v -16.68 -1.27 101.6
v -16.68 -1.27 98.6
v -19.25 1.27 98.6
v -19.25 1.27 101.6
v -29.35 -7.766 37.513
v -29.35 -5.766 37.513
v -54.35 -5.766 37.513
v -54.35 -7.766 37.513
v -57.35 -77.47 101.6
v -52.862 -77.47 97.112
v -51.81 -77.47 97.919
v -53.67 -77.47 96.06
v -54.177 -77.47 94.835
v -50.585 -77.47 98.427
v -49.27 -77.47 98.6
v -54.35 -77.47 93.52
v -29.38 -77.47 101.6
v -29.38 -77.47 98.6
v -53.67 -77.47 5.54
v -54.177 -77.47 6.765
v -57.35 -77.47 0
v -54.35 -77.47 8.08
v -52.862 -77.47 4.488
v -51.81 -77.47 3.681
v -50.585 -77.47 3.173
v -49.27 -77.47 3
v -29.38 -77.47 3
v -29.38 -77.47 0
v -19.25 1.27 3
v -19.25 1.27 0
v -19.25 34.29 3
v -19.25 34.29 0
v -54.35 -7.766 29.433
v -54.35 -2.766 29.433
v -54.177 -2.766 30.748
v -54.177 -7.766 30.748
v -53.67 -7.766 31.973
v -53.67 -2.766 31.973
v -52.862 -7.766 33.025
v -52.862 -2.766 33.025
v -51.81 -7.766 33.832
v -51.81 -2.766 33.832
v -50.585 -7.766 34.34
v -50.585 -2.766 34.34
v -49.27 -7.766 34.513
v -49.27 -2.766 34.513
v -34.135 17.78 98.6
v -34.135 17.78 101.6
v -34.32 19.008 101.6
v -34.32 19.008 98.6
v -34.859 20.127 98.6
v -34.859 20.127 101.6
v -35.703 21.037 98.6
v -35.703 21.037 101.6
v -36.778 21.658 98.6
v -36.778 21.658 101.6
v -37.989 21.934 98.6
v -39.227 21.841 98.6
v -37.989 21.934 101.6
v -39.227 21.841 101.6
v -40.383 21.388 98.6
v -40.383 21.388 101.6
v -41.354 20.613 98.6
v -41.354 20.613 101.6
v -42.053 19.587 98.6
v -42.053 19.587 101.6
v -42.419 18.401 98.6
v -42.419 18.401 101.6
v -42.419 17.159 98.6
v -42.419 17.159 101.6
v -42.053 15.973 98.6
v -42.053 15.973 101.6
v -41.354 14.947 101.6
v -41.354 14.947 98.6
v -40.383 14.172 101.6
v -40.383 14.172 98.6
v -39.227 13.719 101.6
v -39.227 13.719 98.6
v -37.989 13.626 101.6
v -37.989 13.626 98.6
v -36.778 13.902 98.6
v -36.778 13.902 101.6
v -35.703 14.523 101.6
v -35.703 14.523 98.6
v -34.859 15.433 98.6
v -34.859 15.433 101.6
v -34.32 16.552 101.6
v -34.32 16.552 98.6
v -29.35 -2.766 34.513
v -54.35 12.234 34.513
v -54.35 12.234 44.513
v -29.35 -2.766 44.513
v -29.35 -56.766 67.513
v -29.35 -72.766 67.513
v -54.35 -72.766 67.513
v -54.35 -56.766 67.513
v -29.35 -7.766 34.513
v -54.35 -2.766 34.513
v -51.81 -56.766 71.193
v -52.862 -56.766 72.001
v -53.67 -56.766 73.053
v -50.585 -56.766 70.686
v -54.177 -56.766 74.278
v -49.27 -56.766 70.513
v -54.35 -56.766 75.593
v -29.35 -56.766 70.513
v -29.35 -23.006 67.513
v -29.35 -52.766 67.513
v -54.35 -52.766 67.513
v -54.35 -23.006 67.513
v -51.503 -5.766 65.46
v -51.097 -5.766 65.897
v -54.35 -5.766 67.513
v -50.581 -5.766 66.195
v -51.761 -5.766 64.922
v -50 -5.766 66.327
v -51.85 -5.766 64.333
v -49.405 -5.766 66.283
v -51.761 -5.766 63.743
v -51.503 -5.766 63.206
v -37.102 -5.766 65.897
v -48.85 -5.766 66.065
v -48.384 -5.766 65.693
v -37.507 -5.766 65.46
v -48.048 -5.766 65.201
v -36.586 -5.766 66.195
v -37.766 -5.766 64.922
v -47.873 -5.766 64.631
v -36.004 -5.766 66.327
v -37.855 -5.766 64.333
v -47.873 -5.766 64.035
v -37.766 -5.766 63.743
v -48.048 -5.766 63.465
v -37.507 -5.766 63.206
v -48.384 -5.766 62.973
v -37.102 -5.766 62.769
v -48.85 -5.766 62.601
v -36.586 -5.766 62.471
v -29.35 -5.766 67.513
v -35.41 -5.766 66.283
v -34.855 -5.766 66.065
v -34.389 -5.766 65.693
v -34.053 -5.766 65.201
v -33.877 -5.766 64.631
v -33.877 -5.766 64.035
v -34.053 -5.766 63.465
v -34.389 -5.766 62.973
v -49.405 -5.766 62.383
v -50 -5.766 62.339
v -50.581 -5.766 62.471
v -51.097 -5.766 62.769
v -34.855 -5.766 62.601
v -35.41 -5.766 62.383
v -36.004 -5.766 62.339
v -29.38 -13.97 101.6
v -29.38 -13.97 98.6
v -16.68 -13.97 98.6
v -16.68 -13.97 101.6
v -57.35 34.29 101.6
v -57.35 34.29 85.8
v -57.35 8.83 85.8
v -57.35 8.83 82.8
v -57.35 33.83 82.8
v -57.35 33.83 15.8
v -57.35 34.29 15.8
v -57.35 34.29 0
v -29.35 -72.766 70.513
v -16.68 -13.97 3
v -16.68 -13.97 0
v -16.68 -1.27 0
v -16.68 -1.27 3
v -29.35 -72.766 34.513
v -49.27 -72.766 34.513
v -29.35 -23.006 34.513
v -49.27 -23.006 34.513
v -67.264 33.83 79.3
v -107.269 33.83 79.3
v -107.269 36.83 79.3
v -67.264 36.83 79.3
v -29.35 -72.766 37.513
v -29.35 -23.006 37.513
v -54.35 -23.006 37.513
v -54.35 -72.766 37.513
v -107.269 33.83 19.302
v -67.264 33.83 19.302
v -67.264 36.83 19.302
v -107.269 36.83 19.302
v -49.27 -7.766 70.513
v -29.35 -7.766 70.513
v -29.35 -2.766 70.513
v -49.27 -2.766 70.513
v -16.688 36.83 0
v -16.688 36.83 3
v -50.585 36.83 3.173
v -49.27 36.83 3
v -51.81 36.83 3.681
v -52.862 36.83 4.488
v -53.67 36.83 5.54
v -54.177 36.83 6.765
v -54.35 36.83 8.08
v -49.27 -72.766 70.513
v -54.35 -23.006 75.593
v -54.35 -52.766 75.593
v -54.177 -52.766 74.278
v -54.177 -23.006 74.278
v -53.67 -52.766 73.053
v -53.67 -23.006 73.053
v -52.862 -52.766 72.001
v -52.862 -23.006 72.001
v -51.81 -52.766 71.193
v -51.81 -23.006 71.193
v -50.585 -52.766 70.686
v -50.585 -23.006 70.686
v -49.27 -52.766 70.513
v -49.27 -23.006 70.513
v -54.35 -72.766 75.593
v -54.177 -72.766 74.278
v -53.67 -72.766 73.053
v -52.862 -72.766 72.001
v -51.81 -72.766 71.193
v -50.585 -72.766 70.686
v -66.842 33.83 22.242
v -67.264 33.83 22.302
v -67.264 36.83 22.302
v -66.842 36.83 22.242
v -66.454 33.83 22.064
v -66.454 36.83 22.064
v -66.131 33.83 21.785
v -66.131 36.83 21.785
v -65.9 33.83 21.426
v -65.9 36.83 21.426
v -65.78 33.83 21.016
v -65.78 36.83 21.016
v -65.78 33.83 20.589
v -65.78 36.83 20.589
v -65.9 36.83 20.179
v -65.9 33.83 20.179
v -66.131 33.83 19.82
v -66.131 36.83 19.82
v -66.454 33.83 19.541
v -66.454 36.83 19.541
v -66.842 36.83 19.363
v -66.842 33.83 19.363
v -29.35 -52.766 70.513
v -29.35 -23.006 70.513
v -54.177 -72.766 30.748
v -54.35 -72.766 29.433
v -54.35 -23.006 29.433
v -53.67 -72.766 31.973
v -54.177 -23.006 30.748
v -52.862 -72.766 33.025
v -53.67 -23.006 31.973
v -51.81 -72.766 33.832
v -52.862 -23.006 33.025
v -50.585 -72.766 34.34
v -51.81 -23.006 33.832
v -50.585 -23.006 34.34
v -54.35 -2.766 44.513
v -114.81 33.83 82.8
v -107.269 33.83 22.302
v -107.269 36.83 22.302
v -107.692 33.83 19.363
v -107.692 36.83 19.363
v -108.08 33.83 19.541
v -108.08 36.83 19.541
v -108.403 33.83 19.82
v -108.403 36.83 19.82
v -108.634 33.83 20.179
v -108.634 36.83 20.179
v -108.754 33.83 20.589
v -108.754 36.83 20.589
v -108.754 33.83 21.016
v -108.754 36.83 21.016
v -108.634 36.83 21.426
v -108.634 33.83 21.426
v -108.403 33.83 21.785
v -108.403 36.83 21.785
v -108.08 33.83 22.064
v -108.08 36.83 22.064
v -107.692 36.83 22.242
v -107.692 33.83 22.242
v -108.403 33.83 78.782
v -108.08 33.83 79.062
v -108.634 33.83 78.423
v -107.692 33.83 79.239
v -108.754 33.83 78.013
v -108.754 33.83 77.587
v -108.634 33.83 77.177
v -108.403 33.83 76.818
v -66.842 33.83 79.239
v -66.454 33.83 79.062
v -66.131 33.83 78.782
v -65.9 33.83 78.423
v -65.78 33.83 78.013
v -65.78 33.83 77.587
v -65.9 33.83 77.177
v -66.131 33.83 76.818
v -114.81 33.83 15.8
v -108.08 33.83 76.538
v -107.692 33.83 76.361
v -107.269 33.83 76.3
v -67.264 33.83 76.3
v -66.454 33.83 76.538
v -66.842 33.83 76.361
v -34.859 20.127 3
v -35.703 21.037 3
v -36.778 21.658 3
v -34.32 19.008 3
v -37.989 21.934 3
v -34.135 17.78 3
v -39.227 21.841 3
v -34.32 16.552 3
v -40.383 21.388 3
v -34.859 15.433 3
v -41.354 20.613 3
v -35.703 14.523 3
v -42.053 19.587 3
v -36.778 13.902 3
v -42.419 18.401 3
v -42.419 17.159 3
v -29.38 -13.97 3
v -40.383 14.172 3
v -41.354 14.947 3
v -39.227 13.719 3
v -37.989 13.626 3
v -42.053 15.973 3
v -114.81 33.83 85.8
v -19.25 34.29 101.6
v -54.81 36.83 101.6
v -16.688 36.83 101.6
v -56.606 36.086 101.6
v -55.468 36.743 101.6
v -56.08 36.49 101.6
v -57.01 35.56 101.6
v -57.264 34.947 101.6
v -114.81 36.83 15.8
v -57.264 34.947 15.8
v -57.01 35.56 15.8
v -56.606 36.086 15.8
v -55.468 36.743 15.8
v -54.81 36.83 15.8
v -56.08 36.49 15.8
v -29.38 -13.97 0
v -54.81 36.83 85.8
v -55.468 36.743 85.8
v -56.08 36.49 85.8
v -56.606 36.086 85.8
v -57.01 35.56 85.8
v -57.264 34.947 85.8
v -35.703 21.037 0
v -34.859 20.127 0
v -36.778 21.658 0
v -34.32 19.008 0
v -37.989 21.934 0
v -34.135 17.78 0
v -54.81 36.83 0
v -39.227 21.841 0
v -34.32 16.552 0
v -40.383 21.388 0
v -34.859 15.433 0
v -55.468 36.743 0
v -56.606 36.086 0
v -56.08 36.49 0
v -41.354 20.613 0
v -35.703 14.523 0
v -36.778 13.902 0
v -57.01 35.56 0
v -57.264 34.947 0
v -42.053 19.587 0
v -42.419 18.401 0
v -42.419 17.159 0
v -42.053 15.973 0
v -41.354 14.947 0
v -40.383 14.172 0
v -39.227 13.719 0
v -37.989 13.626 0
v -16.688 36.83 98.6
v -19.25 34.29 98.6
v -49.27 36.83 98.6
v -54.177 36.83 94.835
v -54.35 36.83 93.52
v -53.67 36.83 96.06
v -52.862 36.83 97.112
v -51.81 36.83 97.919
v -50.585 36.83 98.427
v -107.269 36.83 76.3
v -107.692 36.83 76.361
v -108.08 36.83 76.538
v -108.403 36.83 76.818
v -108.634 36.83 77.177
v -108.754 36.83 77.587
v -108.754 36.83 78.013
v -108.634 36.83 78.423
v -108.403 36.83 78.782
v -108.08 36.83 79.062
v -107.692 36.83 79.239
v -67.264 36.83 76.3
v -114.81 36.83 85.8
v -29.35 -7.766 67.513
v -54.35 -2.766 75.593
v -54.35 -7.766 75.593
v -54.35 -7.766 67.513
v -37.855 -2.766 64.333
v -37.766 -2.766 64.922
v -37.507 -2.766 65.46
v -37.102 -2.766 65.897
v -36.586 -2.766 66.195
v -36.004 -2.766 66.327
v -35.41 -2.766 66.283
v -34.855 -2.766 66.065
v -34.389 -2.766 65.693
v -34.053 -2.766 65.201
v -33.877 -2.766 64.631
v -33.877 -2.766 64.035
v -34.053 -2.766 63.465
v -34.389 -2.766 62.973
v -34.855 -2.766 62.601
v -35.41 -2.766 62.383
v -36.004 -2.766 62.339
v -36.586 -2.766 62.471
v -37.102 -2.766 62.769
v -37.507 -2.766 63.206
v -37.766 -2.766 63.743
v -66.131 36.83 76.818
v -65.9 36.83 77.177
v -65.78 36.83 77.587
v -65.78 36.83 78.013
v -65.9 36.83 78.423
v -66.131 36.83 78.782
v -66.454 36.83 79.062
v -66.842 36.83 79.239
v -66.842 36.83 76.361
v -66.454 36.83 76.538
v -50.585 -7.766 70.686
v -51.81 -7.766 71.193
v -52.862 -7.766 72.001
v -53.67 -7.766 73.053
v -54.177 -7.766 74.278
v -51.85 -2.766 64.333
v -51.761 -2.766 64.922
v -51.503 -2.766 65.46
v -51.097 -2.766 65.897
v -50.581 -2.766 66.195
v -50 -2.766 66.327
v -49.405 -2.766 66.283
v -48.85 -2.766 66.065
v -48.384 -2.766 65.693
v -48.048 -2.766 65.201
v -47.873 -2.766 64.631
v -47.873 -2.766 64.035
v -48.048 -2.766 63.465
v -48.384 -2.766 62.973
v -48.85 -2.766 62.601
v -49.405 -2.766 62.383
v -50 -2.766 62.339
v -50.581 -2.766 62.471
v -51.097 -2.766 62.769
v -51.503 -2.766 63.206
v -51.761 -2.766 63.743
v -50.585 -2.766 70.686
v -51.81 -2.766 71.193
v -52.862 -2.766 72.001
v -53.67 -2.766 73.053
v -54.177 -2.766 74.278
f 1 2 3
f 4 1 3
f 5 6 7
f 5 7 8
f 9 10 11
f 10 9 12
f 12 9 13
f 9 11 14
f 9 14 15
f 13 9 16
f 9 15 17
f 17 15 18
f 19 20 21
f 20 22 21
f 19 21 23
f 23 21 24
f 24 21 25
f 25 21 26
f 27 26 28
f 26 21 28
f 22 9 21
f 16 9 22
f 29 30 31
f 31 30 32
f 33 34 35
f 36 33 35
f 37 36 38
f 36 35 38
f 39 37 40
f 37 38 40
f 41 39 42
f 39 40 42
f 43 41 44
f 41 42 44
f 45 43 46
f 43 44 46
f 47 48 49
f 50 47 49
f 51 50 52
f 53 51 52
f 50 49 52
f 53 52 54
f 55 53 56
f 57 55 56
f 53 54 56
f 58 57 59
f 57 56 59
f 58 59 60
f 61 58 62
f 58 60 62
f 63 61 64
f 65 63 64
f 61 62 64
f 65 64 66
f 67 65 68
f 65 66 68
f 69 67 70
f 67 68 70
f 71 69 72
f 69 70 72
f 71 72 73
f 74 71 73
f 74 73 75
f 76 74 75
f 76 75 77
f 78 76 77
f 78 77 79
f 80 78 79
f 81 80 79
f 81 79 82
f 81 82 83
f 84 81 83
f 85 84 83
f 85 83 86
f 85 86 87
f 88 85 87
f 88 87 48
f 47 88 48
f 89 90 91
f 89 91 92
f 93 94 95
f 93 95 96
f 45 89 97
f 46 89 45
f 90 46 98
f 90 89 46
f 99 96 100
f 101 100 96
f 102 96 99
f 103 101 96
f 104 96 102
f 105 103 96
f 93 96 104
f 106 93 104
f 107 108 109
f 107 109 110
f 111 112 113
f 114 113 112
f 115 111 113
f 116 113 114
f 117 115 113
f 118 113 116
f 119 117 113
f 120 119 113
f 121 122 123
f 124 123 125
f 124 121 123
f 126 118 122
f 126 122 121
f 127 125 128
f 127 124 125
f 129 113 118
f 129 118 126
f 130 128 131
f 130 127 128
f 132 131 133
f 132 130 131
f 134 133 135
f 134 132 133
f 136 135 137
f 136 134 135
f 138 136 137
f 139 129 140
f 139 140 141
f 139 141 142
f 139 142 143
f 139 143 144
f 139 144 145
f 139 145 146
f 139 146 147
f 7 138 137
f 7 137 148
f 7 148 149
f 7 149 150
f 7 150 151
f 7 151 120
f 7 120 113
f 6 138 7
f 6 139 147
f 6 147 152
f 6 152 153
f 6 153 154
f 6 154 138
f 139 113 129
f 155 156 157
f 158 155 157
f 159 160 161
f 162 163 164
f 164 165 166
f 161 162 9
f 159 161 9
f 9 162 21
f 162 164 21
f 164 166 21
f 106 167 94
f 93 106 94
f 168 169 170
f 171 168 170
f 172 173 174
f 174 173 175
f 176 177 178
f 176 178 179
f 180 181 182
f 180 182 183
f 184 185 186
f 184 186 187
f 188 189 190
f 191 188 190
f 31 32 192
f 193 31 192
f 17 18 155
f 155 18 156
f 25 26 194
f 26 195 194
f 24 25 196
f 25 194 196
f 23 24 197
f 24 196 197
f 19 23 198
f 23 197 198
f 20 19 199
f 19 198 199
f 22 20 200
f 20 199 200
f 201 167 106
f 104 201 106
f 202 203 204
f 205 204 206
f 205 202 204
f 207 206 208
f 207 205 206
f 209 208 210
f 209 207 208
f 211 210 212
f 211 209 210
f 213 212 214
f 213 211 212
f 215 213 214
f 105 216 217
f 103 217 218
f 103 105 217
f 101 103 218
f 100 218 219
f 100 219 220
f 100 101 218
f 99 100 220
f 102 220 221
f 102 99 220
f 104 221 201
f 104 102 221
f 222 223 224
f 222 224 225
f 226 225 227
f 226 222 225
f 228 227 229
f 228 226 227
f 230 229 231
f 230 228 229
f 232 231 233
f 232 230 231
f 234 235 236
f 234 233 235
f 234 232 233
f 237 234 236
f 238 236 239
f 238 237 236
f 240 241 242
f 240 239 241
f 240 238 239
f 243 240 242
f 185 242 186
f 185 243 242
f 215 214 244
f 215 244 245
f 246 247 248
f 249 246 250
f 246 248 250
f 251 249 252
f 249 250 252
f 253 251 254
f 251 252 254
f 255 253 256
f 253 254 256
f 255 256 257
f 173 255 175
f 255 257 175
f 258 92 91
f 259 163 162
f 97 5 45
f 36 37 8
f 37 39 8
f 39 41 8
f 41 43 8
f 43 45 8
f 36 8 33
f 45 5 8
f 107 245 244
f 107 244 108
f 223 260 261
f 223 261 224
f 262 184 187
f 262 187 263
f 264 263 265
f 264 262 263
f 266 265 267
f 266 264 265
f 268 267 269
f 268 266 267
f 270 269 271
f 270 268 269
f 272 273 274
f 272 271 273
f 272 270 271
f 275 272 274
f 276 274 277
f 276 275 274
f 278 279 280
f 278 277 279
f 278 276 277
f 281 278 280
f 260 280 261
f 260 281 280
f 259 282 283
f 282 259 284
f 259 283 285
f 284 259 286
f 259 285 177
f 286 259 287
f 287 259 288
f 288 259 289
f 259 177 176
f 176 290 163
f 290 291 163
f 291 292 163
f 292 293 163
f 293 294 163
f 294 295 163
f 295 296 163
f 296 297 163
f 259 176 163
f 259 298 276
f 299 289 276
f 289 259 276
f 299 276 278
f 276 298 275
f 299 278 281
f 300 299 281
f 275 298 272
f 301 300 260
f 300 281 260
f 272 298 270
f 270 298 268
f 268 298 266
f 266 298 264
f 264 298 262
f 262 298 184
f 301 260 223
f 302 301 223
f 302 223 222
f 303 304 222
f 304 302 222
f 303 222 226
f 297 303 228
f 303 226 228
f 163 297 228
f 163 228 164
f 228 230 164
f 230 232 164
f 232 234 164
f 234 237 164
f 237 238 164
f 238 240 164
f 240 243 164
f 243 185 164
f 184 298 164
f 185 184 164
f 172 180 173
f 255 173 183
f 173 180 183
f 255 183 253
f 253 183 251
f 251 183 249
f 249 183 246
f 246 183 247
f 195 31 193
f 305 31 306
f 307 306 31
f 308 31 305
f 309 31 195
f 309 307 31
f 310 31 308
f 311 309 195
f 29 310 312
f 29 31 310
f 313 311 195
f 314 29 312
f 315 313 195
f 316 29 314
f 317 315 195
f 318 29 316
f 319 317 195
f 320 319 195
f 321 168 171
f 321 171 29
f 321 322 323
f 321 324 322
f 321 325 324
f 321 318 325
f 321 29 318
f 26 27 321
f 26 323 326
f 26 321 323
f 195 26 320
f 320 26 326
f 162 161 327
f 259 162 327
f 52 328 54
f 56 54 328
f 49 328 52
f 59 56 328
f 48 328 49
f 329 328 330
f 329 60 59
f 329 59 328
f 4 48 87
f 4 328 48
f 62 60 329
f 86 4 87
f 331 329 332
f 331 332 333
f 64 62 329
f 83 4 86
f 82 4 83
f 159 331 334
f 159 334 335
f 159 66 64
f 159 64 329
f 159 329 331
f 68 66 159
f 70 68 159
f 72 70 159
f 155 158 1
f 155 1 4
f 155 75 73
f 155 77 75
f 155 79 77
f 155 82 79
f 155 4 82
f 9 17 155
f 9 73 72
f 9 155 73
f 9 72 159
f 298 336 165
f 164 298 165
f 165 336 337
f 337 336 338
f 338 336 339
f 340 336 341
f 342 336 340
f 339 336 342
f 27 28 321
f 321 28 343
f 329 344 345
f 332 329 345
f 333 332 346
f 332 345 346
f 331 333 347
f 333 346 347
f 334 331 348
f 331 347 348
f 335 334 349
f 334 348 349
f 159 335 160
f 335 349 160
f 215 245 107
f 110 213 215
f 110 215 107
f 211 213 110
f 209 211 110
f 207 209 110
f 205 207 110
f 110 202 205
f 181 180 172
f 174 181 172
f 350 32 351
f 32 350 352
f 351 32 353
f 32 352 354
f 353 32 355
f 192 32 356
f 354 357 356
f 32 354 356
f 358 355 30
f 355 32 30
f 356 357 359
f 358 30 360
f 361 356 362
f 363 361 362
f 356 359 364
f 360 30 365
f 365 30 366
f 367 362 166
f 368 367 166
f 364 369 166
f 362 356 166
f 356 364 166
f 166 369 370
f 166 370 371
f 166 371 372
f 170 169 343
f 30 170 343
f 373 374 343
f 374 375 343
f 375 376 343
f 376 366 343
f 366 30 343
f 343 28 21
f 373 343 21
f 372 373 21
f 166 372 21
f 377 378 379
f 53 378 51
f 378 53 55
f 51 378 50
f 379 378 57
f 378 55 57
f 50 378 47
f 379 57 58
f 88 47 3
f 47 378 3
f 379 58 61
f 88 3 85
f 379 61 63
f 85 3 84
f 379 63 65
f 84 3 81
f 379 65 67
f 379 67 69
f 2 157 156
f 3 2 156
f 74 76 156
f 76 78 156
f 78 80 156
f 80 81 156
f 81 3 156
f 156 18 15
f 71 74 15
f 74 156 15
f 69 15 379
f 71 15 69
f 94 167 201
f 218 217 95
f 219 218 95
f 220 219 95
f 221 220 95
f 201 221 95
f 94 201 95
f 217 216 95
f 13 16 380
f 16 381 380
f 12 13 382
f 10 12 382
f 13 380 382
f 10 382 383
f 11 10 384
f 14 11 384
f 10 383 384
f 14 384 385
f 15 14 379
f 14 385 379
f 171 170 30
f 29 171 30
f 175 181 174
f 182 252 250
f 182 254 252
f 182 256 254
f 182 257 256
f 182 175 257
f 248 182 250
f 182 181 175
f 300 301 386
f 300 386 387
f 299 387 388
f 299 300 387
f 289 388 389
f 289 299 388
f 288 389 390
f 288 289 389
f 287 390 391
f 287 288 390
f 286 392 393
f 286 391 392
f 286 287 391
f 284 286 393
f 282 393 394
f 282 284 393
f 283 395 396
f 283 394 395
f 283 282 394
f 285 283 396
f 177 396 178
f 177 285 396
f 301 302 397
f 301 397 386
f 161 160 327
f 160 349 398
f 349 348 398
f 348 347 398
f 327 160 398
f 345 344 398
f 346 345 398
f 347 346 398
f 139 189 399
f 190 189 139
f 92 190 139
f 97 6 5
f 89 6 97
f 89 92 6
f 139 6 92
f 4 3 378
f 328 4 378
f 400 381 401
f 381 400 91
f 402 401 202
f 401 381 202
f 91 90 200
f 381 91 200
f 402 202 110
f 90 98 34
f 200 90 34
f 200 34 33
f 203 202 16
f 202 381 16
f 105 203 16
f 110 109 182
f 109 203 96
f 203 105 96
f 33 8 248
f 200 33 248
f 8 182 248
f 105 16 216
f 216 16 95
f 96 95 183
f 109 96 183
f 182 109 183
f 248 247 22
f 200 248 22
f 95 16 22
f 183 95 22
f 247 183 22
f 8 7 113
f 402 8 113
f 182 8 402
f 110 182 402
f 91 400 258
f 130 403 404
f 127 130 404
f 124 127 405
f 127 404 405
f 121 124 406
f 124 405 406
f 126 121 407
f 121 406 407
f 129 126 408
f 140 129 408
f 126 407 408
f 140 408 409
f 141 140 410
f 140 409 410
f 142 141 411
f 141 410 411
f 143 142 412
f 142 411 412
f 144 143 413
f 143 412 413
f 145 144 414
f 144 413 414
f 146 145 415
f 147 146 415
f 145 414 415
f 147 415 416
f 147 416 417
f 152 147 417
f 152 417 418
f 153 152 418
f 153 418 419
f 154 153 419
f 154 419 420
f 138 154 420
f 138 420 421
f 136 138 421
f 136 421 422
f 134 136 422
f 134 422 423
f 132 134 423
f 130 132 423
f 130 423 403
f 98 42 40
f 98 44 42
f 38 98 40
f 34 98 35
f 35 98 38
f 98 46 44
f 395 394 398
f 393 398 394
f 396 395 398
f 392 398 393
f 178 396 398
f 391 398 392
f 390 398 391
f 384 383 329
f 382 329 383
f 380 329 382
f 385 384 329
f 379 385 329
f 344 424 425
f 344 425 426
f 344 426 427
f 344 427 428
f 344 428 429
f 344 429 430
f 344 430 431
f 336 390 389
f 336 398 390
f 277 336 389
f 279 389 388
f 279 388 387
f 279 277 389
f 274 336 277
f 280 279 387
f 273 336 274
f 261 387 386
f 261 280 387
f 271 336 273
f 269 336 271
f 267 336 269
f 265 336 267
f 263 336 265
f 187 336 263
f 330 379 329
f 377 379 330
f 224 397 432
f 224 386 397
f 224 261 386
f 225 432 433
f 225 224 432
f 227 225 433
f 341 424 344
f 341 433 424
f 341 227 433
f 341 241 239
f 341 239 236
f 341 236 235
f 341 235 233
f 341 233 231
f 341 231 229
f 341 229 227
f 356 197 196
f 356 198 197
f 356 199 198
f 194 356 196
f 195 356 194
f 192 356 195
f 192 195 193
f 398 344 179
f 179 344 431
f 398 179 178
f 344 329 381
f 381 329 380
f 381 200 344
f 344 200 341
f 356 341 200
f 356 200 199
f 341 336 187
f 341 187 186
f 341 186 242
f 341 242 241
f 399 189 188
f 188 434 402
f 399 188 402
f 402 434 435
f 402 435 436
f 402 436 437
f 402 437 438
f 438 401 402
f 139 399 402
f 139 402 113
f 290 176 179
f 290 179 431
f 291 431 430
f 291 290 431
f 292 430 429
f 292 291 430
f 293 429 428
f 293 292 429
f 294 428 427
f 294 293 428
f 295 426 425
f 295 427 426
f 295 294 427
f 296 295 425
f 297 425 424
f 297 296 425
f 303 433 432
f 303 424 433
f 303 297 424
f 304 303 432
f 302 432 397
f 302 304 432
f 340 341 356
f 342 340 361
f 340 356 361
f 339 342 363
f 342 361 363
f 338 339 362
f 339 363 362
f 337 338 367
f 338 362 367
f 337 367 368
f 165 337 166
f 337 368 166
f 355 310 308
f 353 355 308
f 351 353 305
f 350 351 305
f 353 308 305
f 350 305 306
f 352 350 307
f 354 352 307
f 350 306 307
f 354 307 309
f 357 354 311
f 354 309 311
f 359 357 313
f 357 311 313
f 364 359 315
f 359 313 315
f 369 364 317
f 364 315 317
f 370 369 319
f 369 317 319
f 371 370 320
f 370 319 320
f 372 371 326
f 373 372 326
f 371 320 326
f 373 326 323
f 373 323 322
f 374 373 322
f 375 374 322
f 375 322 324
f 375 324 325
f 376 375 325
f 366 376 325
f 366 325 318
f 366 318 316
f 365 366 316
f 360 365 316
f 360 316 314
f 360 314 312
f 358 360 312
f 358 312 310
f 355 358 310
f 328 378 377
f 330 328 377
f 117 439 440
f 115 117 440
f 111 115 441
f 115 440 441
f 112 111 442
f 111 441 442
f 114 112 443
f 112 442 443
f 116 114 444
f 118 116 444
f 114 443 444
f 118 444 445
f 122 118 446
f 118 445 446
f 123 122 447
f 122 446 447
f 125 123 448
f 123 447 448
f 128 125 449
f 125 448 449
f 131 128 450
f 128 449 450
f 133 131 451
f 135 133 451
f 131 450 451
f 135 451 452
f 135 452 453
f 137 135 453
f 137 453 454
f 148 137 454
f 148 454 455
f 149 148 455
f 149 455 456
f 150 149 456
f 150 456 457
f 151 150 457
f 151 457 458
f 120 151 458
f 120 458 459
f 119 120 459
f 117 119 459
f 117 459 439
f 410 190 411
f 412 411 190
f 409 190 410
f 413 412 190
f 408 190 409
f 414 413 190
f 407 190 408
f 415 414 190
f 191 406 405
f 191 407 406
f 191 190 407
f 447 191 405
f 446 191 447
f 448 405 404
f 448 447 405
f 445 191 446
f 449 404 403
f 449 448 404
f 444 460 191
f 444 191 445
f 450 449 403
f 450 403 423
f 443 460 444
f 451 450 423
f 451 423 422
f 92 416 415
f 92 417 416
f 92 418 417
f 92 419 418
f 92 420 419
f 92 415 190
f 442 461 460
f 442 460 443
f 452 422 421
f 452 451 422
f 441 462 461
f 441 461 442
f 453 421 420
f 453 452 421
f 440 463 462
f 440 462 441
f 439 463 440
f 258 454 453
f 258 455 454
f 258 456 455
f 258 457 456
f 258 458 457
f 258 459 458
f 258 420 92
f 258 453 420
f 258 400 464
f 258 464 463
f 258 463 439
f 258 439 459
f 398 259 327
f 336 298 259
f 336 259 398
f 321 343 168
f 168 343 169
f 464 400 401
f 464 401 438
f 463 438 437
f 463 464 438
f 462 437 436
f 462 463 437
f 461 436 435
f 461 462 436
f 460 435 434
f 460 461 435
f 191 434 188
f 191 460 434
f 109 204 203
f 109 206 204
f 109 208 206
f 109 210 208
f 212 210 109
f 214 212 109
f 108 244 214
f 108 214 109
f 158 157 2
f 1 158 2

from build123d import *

# Parameters (mm, degrees)
BOSS_EXTRUDE1_DEPTH      = 101.6
SKETCH2_R                = 4.1656
CUT_EXTRUDE1_DEPTH       = 141.047212542
SKETCH3_W                = 45.3392611
SKETCH3_H                = 95.6
CUT_EXTRUDE2_DEPTH       = 164.328230385
SKETCH5_W                = 36
SKETCH5_H                = 70
BOSS_EXTRUDE2_DEPTH      = 25
CUT_EXTRUDE3_DEPTH       = 25
FILLET1_R                = 5.08
SKETCH7_R                = 2
CUT_EXTRUDE4_DEPTH       = 139.536371578
CUT_EXTRUDE5_DEPTH       = 7.488
CUT_EXTRUDE5_DEPTH_BACK  = 44.572
SKETCH8_W                = 30.464500282
SKETCH8_H                = 15.24
BOSS_EXTRUDE3_DEPTH      = 10
BOSS_EXTRUDE4_DEPTH      = 35
BOSS_EXTRUDE4_DEPTH_BACK = 35
SKETCH11_W               = 60
SKETCH11_H               = 3
BOSS_EXTRUDE5_DEPTH      = 3
CUT_EXTRUDE6_DEPTH       = 190.450951053


with BuildPart() as part:
    # Sketch1 → Boss-Extrude1 (new body)
    with BuildSketch(Plane(origin=(0, 0, 0), x_dir=(-1, 0, 0), z_dir=(0, 0, 1))):
        with BuildLine():
            Line((57.350334268, 77.47), (29.380183448, 77.47))
            Line((29.380183448, 77.47), (29.380183448, 13.97))
            Line((29.380183448, 13.97), (16.680183448, 13.97))
            Line((16.680183448, 13.97), (16.680183448, 1.27))
            Line((16.680183448, 1.27), (19.250334268, -1.27))
            Line((19.250334268, -1.27), (19.250334268, -34.29))
            Line((19.250334268, -34.29), (16.6878, -36.83))
            Line((16.6878, -36.83), (54.810334268, -36.83))
            ThreePointArc((54.810334268, -36.83), (56.606385492, -36.086051224), (57.350334268, -34.29))
            Line((57.350334268, -34.29), (57.350334268, 77.47))
        make_face()
    extrude(amount=BOSS_EXTRUDE1_DEPTH)

    # Sketch2 → Cut-Extrude1 (cut, through all)
    with BuildSketch(Plane.XY.offset(101.6)):
        with Locations((-38.300334268, 17.78)):
            Circle(SKETCH2_R)
    extrude(amount=-CUT_EXTRUDE1_DEPTH, mode=Mode.SUBTRACT)

    # Sketch3 → Cut-Extrude2 (cut, through all)
    with BuildSketch(Plane(origin=(0, -77.47, 0), x_dir=(-1, 0, 0), z_dir=(0, -1, 0))):
        with Locations((31.680703718, -50.8)):
            Rectangle(SKETCH3_W, SKETCH3_H)
    extrude(amount=-CUT_EXTRUDE2_DEPTH, mode=Mode.SUBTRACT)

    # Sketch5 → Boss-Extrude2 (add)
    with BuildSketch(Plane(origin=(-54.350334268, 0, 0), x_dir=(0, 0, -1), z_dir=(1, 0, 0))):
        with Locations((-52.512822265, -37.765880907)):
            Rectangle(SKETCH5_W, SKETCH5_H)
    extrude(amount=BOSS_EXTRUDE2_DEPTH)

    # Sketch6 → Cut-Extrude3 (cut)
    with BuildSketch(Plane(origin=(-29.350334268, 0, 0), x_dir=(0, 0, -1), z_dir=(1, 0, 0))):
        Polygon((-67.512822265, -5.765880907), (-37.512822265, -5.765880907), (-37.512822265, -85.765880907), (-67.512822265, -85.765880907), (-67.512822265, -56.765880907), (-78.412691352, -56.765880907), (-78.412691352, -52.765880907), (-67.512822265, -52.765880907), align=None)
    extrude(amount=-CUT_EXTRUDE3_DEPTH, mode=Mode.SUBTRACT)

    # Fillet1
    fillet1_edges = [part.edges().sort_by_distance(p)[0] for p in [
        (-54.350334268, -20.32, 98.6),
        (-54.350334268, -20.32, 3),
        (-54.350334268, -37.765880907, 34.512822265),
        (-54.350334268, -27.765880907, 70.512822265),
        (-54.350334268, -64.765880907, 70.512822265),
    ]]
    fillet(fillet1_edges, radius=FILLET1_R)

    # Sketch7 → Cut-Extrude4 (cut, through all)
    with BuildSketch(Plane(origin=(0, -2.765880907, 0), x_dir=(1, 0, 0), z_dir=(0, 1, 0))):
        with Locations(Location((-49.850334378, -64.332963641, 0), (0, 0, 180))):
            Circle(SKETCH7_R)
        with Locations(Location((-35.854934378, -64.332963641, 0), (0, 0, 180))):
            Circle(SKETCH7_R)
    extrude(amount=-CUT_EXTRUDE4_DEPTH, mode=Mode.SUBTRACT)

    # Sketch8 → Cut-Extrude5 (cut, two sides: drawn at the far end of the back side and taken through both)
    with BuildSketch(Plane(origin=(0, 0, 34.512822265), x_dir=(-1, 0, 0), z_dir=(0, 0, -1)).offset(-CUT_EXTRUDE5_DEPTH_BACK)):
        with Locations((39.118084127, -15.385880813)):
            Rectangle(SKETCH8_W, SKETCH8_H)
    extrude(amount=CUT_EXTRUDE5_DEPTH + CUT_EXTRUDE5_DEPTH_BACK, mode=Mode.SUBTRACT)

    # Sketch9 → Boss-Extrude3 (add)
    with BuildSketch(Plane(origin=(0, 0, 34.512822265), x_dir=(-1, 0, 0), z_dir=(0, 0, -1))):
        Polygon((29.350334268, -2.765880907), (54.350334268, -2.765880907), (54.350334268, 12.234119093), align=None)
    extrude(amount=-BOSS_EXTRUDE3_DEPTH)

    # Sketch11 → Boss-Extrude4 (add, two sides: drawn at the far end of the back side and taken through both)
    with BuildSketch(Plane.XY.offset(50.8).offset(-BOSS_EXTRUDE4_DEPTH_BACK)):
        with Locations((-84.810334268, 35.33)):
            Rectangle(SKETCH11_W, SKETCH11_H)
    extrude(amount=BOSS_EXTRUDE4_DEPTH + BOSS_EXTRUDE4_DEPTH_BACK)

    # Sketch12 → Boss-Extrude5 (add)
    with BuildSketch(Plane.XY.offset(85.8)):
        Polygon((-114.810334268, 33.83), (-57.350334268, 33.83), (-57.350334268, 8.83), align=None)
    extrude(amount=-BOSS_EXTRUDE5_DEPTH)

    # Sketch13 → Cut-Extrude6 (cut, through all)
    with BuildSketch(Plane(origin=(0, 33.83, 0), x_dir=(-1, 0, 0), z_dir=(0, -1, 0))):
        with BuildLine():
            Line((107.269485022, -79.300000094), (67.264485022, -79.300000094))
            ThreePointArc((67.264485022, -79.300000094), (65.764485022, -77.800000094), (67.264485022, -76.300000094))
            Line((67.264485022, -76.300000094), (107.269485022, -76.300000094))
            ThreePointArc((107.269485022, -76.300000094), (108.769485022, -77.800000094), (107.269485022, -79.300000094))
        make_face()
        with BuildLine():
            Line((107.269485022, -22.302400094), (67.264485022, -22.302400094))
            ThreePointArc((67.264485022, -22.302400094), (65.764485022, -20.802400094), (67.264485022, -19.302400094))
            Line((67.264485022, -19.302400094), (107.269485022, -19.302400094))
            ThreePointArc((107.269485022, -19.302400094), (108.769485022, -20.802400094), (107.269485022, -22.302400094))
        make_face()
    extrude(amount=-CUT_EXTRUDE6_DEPTH, mode=Mode.SUBTRACT)


solid = part.part
